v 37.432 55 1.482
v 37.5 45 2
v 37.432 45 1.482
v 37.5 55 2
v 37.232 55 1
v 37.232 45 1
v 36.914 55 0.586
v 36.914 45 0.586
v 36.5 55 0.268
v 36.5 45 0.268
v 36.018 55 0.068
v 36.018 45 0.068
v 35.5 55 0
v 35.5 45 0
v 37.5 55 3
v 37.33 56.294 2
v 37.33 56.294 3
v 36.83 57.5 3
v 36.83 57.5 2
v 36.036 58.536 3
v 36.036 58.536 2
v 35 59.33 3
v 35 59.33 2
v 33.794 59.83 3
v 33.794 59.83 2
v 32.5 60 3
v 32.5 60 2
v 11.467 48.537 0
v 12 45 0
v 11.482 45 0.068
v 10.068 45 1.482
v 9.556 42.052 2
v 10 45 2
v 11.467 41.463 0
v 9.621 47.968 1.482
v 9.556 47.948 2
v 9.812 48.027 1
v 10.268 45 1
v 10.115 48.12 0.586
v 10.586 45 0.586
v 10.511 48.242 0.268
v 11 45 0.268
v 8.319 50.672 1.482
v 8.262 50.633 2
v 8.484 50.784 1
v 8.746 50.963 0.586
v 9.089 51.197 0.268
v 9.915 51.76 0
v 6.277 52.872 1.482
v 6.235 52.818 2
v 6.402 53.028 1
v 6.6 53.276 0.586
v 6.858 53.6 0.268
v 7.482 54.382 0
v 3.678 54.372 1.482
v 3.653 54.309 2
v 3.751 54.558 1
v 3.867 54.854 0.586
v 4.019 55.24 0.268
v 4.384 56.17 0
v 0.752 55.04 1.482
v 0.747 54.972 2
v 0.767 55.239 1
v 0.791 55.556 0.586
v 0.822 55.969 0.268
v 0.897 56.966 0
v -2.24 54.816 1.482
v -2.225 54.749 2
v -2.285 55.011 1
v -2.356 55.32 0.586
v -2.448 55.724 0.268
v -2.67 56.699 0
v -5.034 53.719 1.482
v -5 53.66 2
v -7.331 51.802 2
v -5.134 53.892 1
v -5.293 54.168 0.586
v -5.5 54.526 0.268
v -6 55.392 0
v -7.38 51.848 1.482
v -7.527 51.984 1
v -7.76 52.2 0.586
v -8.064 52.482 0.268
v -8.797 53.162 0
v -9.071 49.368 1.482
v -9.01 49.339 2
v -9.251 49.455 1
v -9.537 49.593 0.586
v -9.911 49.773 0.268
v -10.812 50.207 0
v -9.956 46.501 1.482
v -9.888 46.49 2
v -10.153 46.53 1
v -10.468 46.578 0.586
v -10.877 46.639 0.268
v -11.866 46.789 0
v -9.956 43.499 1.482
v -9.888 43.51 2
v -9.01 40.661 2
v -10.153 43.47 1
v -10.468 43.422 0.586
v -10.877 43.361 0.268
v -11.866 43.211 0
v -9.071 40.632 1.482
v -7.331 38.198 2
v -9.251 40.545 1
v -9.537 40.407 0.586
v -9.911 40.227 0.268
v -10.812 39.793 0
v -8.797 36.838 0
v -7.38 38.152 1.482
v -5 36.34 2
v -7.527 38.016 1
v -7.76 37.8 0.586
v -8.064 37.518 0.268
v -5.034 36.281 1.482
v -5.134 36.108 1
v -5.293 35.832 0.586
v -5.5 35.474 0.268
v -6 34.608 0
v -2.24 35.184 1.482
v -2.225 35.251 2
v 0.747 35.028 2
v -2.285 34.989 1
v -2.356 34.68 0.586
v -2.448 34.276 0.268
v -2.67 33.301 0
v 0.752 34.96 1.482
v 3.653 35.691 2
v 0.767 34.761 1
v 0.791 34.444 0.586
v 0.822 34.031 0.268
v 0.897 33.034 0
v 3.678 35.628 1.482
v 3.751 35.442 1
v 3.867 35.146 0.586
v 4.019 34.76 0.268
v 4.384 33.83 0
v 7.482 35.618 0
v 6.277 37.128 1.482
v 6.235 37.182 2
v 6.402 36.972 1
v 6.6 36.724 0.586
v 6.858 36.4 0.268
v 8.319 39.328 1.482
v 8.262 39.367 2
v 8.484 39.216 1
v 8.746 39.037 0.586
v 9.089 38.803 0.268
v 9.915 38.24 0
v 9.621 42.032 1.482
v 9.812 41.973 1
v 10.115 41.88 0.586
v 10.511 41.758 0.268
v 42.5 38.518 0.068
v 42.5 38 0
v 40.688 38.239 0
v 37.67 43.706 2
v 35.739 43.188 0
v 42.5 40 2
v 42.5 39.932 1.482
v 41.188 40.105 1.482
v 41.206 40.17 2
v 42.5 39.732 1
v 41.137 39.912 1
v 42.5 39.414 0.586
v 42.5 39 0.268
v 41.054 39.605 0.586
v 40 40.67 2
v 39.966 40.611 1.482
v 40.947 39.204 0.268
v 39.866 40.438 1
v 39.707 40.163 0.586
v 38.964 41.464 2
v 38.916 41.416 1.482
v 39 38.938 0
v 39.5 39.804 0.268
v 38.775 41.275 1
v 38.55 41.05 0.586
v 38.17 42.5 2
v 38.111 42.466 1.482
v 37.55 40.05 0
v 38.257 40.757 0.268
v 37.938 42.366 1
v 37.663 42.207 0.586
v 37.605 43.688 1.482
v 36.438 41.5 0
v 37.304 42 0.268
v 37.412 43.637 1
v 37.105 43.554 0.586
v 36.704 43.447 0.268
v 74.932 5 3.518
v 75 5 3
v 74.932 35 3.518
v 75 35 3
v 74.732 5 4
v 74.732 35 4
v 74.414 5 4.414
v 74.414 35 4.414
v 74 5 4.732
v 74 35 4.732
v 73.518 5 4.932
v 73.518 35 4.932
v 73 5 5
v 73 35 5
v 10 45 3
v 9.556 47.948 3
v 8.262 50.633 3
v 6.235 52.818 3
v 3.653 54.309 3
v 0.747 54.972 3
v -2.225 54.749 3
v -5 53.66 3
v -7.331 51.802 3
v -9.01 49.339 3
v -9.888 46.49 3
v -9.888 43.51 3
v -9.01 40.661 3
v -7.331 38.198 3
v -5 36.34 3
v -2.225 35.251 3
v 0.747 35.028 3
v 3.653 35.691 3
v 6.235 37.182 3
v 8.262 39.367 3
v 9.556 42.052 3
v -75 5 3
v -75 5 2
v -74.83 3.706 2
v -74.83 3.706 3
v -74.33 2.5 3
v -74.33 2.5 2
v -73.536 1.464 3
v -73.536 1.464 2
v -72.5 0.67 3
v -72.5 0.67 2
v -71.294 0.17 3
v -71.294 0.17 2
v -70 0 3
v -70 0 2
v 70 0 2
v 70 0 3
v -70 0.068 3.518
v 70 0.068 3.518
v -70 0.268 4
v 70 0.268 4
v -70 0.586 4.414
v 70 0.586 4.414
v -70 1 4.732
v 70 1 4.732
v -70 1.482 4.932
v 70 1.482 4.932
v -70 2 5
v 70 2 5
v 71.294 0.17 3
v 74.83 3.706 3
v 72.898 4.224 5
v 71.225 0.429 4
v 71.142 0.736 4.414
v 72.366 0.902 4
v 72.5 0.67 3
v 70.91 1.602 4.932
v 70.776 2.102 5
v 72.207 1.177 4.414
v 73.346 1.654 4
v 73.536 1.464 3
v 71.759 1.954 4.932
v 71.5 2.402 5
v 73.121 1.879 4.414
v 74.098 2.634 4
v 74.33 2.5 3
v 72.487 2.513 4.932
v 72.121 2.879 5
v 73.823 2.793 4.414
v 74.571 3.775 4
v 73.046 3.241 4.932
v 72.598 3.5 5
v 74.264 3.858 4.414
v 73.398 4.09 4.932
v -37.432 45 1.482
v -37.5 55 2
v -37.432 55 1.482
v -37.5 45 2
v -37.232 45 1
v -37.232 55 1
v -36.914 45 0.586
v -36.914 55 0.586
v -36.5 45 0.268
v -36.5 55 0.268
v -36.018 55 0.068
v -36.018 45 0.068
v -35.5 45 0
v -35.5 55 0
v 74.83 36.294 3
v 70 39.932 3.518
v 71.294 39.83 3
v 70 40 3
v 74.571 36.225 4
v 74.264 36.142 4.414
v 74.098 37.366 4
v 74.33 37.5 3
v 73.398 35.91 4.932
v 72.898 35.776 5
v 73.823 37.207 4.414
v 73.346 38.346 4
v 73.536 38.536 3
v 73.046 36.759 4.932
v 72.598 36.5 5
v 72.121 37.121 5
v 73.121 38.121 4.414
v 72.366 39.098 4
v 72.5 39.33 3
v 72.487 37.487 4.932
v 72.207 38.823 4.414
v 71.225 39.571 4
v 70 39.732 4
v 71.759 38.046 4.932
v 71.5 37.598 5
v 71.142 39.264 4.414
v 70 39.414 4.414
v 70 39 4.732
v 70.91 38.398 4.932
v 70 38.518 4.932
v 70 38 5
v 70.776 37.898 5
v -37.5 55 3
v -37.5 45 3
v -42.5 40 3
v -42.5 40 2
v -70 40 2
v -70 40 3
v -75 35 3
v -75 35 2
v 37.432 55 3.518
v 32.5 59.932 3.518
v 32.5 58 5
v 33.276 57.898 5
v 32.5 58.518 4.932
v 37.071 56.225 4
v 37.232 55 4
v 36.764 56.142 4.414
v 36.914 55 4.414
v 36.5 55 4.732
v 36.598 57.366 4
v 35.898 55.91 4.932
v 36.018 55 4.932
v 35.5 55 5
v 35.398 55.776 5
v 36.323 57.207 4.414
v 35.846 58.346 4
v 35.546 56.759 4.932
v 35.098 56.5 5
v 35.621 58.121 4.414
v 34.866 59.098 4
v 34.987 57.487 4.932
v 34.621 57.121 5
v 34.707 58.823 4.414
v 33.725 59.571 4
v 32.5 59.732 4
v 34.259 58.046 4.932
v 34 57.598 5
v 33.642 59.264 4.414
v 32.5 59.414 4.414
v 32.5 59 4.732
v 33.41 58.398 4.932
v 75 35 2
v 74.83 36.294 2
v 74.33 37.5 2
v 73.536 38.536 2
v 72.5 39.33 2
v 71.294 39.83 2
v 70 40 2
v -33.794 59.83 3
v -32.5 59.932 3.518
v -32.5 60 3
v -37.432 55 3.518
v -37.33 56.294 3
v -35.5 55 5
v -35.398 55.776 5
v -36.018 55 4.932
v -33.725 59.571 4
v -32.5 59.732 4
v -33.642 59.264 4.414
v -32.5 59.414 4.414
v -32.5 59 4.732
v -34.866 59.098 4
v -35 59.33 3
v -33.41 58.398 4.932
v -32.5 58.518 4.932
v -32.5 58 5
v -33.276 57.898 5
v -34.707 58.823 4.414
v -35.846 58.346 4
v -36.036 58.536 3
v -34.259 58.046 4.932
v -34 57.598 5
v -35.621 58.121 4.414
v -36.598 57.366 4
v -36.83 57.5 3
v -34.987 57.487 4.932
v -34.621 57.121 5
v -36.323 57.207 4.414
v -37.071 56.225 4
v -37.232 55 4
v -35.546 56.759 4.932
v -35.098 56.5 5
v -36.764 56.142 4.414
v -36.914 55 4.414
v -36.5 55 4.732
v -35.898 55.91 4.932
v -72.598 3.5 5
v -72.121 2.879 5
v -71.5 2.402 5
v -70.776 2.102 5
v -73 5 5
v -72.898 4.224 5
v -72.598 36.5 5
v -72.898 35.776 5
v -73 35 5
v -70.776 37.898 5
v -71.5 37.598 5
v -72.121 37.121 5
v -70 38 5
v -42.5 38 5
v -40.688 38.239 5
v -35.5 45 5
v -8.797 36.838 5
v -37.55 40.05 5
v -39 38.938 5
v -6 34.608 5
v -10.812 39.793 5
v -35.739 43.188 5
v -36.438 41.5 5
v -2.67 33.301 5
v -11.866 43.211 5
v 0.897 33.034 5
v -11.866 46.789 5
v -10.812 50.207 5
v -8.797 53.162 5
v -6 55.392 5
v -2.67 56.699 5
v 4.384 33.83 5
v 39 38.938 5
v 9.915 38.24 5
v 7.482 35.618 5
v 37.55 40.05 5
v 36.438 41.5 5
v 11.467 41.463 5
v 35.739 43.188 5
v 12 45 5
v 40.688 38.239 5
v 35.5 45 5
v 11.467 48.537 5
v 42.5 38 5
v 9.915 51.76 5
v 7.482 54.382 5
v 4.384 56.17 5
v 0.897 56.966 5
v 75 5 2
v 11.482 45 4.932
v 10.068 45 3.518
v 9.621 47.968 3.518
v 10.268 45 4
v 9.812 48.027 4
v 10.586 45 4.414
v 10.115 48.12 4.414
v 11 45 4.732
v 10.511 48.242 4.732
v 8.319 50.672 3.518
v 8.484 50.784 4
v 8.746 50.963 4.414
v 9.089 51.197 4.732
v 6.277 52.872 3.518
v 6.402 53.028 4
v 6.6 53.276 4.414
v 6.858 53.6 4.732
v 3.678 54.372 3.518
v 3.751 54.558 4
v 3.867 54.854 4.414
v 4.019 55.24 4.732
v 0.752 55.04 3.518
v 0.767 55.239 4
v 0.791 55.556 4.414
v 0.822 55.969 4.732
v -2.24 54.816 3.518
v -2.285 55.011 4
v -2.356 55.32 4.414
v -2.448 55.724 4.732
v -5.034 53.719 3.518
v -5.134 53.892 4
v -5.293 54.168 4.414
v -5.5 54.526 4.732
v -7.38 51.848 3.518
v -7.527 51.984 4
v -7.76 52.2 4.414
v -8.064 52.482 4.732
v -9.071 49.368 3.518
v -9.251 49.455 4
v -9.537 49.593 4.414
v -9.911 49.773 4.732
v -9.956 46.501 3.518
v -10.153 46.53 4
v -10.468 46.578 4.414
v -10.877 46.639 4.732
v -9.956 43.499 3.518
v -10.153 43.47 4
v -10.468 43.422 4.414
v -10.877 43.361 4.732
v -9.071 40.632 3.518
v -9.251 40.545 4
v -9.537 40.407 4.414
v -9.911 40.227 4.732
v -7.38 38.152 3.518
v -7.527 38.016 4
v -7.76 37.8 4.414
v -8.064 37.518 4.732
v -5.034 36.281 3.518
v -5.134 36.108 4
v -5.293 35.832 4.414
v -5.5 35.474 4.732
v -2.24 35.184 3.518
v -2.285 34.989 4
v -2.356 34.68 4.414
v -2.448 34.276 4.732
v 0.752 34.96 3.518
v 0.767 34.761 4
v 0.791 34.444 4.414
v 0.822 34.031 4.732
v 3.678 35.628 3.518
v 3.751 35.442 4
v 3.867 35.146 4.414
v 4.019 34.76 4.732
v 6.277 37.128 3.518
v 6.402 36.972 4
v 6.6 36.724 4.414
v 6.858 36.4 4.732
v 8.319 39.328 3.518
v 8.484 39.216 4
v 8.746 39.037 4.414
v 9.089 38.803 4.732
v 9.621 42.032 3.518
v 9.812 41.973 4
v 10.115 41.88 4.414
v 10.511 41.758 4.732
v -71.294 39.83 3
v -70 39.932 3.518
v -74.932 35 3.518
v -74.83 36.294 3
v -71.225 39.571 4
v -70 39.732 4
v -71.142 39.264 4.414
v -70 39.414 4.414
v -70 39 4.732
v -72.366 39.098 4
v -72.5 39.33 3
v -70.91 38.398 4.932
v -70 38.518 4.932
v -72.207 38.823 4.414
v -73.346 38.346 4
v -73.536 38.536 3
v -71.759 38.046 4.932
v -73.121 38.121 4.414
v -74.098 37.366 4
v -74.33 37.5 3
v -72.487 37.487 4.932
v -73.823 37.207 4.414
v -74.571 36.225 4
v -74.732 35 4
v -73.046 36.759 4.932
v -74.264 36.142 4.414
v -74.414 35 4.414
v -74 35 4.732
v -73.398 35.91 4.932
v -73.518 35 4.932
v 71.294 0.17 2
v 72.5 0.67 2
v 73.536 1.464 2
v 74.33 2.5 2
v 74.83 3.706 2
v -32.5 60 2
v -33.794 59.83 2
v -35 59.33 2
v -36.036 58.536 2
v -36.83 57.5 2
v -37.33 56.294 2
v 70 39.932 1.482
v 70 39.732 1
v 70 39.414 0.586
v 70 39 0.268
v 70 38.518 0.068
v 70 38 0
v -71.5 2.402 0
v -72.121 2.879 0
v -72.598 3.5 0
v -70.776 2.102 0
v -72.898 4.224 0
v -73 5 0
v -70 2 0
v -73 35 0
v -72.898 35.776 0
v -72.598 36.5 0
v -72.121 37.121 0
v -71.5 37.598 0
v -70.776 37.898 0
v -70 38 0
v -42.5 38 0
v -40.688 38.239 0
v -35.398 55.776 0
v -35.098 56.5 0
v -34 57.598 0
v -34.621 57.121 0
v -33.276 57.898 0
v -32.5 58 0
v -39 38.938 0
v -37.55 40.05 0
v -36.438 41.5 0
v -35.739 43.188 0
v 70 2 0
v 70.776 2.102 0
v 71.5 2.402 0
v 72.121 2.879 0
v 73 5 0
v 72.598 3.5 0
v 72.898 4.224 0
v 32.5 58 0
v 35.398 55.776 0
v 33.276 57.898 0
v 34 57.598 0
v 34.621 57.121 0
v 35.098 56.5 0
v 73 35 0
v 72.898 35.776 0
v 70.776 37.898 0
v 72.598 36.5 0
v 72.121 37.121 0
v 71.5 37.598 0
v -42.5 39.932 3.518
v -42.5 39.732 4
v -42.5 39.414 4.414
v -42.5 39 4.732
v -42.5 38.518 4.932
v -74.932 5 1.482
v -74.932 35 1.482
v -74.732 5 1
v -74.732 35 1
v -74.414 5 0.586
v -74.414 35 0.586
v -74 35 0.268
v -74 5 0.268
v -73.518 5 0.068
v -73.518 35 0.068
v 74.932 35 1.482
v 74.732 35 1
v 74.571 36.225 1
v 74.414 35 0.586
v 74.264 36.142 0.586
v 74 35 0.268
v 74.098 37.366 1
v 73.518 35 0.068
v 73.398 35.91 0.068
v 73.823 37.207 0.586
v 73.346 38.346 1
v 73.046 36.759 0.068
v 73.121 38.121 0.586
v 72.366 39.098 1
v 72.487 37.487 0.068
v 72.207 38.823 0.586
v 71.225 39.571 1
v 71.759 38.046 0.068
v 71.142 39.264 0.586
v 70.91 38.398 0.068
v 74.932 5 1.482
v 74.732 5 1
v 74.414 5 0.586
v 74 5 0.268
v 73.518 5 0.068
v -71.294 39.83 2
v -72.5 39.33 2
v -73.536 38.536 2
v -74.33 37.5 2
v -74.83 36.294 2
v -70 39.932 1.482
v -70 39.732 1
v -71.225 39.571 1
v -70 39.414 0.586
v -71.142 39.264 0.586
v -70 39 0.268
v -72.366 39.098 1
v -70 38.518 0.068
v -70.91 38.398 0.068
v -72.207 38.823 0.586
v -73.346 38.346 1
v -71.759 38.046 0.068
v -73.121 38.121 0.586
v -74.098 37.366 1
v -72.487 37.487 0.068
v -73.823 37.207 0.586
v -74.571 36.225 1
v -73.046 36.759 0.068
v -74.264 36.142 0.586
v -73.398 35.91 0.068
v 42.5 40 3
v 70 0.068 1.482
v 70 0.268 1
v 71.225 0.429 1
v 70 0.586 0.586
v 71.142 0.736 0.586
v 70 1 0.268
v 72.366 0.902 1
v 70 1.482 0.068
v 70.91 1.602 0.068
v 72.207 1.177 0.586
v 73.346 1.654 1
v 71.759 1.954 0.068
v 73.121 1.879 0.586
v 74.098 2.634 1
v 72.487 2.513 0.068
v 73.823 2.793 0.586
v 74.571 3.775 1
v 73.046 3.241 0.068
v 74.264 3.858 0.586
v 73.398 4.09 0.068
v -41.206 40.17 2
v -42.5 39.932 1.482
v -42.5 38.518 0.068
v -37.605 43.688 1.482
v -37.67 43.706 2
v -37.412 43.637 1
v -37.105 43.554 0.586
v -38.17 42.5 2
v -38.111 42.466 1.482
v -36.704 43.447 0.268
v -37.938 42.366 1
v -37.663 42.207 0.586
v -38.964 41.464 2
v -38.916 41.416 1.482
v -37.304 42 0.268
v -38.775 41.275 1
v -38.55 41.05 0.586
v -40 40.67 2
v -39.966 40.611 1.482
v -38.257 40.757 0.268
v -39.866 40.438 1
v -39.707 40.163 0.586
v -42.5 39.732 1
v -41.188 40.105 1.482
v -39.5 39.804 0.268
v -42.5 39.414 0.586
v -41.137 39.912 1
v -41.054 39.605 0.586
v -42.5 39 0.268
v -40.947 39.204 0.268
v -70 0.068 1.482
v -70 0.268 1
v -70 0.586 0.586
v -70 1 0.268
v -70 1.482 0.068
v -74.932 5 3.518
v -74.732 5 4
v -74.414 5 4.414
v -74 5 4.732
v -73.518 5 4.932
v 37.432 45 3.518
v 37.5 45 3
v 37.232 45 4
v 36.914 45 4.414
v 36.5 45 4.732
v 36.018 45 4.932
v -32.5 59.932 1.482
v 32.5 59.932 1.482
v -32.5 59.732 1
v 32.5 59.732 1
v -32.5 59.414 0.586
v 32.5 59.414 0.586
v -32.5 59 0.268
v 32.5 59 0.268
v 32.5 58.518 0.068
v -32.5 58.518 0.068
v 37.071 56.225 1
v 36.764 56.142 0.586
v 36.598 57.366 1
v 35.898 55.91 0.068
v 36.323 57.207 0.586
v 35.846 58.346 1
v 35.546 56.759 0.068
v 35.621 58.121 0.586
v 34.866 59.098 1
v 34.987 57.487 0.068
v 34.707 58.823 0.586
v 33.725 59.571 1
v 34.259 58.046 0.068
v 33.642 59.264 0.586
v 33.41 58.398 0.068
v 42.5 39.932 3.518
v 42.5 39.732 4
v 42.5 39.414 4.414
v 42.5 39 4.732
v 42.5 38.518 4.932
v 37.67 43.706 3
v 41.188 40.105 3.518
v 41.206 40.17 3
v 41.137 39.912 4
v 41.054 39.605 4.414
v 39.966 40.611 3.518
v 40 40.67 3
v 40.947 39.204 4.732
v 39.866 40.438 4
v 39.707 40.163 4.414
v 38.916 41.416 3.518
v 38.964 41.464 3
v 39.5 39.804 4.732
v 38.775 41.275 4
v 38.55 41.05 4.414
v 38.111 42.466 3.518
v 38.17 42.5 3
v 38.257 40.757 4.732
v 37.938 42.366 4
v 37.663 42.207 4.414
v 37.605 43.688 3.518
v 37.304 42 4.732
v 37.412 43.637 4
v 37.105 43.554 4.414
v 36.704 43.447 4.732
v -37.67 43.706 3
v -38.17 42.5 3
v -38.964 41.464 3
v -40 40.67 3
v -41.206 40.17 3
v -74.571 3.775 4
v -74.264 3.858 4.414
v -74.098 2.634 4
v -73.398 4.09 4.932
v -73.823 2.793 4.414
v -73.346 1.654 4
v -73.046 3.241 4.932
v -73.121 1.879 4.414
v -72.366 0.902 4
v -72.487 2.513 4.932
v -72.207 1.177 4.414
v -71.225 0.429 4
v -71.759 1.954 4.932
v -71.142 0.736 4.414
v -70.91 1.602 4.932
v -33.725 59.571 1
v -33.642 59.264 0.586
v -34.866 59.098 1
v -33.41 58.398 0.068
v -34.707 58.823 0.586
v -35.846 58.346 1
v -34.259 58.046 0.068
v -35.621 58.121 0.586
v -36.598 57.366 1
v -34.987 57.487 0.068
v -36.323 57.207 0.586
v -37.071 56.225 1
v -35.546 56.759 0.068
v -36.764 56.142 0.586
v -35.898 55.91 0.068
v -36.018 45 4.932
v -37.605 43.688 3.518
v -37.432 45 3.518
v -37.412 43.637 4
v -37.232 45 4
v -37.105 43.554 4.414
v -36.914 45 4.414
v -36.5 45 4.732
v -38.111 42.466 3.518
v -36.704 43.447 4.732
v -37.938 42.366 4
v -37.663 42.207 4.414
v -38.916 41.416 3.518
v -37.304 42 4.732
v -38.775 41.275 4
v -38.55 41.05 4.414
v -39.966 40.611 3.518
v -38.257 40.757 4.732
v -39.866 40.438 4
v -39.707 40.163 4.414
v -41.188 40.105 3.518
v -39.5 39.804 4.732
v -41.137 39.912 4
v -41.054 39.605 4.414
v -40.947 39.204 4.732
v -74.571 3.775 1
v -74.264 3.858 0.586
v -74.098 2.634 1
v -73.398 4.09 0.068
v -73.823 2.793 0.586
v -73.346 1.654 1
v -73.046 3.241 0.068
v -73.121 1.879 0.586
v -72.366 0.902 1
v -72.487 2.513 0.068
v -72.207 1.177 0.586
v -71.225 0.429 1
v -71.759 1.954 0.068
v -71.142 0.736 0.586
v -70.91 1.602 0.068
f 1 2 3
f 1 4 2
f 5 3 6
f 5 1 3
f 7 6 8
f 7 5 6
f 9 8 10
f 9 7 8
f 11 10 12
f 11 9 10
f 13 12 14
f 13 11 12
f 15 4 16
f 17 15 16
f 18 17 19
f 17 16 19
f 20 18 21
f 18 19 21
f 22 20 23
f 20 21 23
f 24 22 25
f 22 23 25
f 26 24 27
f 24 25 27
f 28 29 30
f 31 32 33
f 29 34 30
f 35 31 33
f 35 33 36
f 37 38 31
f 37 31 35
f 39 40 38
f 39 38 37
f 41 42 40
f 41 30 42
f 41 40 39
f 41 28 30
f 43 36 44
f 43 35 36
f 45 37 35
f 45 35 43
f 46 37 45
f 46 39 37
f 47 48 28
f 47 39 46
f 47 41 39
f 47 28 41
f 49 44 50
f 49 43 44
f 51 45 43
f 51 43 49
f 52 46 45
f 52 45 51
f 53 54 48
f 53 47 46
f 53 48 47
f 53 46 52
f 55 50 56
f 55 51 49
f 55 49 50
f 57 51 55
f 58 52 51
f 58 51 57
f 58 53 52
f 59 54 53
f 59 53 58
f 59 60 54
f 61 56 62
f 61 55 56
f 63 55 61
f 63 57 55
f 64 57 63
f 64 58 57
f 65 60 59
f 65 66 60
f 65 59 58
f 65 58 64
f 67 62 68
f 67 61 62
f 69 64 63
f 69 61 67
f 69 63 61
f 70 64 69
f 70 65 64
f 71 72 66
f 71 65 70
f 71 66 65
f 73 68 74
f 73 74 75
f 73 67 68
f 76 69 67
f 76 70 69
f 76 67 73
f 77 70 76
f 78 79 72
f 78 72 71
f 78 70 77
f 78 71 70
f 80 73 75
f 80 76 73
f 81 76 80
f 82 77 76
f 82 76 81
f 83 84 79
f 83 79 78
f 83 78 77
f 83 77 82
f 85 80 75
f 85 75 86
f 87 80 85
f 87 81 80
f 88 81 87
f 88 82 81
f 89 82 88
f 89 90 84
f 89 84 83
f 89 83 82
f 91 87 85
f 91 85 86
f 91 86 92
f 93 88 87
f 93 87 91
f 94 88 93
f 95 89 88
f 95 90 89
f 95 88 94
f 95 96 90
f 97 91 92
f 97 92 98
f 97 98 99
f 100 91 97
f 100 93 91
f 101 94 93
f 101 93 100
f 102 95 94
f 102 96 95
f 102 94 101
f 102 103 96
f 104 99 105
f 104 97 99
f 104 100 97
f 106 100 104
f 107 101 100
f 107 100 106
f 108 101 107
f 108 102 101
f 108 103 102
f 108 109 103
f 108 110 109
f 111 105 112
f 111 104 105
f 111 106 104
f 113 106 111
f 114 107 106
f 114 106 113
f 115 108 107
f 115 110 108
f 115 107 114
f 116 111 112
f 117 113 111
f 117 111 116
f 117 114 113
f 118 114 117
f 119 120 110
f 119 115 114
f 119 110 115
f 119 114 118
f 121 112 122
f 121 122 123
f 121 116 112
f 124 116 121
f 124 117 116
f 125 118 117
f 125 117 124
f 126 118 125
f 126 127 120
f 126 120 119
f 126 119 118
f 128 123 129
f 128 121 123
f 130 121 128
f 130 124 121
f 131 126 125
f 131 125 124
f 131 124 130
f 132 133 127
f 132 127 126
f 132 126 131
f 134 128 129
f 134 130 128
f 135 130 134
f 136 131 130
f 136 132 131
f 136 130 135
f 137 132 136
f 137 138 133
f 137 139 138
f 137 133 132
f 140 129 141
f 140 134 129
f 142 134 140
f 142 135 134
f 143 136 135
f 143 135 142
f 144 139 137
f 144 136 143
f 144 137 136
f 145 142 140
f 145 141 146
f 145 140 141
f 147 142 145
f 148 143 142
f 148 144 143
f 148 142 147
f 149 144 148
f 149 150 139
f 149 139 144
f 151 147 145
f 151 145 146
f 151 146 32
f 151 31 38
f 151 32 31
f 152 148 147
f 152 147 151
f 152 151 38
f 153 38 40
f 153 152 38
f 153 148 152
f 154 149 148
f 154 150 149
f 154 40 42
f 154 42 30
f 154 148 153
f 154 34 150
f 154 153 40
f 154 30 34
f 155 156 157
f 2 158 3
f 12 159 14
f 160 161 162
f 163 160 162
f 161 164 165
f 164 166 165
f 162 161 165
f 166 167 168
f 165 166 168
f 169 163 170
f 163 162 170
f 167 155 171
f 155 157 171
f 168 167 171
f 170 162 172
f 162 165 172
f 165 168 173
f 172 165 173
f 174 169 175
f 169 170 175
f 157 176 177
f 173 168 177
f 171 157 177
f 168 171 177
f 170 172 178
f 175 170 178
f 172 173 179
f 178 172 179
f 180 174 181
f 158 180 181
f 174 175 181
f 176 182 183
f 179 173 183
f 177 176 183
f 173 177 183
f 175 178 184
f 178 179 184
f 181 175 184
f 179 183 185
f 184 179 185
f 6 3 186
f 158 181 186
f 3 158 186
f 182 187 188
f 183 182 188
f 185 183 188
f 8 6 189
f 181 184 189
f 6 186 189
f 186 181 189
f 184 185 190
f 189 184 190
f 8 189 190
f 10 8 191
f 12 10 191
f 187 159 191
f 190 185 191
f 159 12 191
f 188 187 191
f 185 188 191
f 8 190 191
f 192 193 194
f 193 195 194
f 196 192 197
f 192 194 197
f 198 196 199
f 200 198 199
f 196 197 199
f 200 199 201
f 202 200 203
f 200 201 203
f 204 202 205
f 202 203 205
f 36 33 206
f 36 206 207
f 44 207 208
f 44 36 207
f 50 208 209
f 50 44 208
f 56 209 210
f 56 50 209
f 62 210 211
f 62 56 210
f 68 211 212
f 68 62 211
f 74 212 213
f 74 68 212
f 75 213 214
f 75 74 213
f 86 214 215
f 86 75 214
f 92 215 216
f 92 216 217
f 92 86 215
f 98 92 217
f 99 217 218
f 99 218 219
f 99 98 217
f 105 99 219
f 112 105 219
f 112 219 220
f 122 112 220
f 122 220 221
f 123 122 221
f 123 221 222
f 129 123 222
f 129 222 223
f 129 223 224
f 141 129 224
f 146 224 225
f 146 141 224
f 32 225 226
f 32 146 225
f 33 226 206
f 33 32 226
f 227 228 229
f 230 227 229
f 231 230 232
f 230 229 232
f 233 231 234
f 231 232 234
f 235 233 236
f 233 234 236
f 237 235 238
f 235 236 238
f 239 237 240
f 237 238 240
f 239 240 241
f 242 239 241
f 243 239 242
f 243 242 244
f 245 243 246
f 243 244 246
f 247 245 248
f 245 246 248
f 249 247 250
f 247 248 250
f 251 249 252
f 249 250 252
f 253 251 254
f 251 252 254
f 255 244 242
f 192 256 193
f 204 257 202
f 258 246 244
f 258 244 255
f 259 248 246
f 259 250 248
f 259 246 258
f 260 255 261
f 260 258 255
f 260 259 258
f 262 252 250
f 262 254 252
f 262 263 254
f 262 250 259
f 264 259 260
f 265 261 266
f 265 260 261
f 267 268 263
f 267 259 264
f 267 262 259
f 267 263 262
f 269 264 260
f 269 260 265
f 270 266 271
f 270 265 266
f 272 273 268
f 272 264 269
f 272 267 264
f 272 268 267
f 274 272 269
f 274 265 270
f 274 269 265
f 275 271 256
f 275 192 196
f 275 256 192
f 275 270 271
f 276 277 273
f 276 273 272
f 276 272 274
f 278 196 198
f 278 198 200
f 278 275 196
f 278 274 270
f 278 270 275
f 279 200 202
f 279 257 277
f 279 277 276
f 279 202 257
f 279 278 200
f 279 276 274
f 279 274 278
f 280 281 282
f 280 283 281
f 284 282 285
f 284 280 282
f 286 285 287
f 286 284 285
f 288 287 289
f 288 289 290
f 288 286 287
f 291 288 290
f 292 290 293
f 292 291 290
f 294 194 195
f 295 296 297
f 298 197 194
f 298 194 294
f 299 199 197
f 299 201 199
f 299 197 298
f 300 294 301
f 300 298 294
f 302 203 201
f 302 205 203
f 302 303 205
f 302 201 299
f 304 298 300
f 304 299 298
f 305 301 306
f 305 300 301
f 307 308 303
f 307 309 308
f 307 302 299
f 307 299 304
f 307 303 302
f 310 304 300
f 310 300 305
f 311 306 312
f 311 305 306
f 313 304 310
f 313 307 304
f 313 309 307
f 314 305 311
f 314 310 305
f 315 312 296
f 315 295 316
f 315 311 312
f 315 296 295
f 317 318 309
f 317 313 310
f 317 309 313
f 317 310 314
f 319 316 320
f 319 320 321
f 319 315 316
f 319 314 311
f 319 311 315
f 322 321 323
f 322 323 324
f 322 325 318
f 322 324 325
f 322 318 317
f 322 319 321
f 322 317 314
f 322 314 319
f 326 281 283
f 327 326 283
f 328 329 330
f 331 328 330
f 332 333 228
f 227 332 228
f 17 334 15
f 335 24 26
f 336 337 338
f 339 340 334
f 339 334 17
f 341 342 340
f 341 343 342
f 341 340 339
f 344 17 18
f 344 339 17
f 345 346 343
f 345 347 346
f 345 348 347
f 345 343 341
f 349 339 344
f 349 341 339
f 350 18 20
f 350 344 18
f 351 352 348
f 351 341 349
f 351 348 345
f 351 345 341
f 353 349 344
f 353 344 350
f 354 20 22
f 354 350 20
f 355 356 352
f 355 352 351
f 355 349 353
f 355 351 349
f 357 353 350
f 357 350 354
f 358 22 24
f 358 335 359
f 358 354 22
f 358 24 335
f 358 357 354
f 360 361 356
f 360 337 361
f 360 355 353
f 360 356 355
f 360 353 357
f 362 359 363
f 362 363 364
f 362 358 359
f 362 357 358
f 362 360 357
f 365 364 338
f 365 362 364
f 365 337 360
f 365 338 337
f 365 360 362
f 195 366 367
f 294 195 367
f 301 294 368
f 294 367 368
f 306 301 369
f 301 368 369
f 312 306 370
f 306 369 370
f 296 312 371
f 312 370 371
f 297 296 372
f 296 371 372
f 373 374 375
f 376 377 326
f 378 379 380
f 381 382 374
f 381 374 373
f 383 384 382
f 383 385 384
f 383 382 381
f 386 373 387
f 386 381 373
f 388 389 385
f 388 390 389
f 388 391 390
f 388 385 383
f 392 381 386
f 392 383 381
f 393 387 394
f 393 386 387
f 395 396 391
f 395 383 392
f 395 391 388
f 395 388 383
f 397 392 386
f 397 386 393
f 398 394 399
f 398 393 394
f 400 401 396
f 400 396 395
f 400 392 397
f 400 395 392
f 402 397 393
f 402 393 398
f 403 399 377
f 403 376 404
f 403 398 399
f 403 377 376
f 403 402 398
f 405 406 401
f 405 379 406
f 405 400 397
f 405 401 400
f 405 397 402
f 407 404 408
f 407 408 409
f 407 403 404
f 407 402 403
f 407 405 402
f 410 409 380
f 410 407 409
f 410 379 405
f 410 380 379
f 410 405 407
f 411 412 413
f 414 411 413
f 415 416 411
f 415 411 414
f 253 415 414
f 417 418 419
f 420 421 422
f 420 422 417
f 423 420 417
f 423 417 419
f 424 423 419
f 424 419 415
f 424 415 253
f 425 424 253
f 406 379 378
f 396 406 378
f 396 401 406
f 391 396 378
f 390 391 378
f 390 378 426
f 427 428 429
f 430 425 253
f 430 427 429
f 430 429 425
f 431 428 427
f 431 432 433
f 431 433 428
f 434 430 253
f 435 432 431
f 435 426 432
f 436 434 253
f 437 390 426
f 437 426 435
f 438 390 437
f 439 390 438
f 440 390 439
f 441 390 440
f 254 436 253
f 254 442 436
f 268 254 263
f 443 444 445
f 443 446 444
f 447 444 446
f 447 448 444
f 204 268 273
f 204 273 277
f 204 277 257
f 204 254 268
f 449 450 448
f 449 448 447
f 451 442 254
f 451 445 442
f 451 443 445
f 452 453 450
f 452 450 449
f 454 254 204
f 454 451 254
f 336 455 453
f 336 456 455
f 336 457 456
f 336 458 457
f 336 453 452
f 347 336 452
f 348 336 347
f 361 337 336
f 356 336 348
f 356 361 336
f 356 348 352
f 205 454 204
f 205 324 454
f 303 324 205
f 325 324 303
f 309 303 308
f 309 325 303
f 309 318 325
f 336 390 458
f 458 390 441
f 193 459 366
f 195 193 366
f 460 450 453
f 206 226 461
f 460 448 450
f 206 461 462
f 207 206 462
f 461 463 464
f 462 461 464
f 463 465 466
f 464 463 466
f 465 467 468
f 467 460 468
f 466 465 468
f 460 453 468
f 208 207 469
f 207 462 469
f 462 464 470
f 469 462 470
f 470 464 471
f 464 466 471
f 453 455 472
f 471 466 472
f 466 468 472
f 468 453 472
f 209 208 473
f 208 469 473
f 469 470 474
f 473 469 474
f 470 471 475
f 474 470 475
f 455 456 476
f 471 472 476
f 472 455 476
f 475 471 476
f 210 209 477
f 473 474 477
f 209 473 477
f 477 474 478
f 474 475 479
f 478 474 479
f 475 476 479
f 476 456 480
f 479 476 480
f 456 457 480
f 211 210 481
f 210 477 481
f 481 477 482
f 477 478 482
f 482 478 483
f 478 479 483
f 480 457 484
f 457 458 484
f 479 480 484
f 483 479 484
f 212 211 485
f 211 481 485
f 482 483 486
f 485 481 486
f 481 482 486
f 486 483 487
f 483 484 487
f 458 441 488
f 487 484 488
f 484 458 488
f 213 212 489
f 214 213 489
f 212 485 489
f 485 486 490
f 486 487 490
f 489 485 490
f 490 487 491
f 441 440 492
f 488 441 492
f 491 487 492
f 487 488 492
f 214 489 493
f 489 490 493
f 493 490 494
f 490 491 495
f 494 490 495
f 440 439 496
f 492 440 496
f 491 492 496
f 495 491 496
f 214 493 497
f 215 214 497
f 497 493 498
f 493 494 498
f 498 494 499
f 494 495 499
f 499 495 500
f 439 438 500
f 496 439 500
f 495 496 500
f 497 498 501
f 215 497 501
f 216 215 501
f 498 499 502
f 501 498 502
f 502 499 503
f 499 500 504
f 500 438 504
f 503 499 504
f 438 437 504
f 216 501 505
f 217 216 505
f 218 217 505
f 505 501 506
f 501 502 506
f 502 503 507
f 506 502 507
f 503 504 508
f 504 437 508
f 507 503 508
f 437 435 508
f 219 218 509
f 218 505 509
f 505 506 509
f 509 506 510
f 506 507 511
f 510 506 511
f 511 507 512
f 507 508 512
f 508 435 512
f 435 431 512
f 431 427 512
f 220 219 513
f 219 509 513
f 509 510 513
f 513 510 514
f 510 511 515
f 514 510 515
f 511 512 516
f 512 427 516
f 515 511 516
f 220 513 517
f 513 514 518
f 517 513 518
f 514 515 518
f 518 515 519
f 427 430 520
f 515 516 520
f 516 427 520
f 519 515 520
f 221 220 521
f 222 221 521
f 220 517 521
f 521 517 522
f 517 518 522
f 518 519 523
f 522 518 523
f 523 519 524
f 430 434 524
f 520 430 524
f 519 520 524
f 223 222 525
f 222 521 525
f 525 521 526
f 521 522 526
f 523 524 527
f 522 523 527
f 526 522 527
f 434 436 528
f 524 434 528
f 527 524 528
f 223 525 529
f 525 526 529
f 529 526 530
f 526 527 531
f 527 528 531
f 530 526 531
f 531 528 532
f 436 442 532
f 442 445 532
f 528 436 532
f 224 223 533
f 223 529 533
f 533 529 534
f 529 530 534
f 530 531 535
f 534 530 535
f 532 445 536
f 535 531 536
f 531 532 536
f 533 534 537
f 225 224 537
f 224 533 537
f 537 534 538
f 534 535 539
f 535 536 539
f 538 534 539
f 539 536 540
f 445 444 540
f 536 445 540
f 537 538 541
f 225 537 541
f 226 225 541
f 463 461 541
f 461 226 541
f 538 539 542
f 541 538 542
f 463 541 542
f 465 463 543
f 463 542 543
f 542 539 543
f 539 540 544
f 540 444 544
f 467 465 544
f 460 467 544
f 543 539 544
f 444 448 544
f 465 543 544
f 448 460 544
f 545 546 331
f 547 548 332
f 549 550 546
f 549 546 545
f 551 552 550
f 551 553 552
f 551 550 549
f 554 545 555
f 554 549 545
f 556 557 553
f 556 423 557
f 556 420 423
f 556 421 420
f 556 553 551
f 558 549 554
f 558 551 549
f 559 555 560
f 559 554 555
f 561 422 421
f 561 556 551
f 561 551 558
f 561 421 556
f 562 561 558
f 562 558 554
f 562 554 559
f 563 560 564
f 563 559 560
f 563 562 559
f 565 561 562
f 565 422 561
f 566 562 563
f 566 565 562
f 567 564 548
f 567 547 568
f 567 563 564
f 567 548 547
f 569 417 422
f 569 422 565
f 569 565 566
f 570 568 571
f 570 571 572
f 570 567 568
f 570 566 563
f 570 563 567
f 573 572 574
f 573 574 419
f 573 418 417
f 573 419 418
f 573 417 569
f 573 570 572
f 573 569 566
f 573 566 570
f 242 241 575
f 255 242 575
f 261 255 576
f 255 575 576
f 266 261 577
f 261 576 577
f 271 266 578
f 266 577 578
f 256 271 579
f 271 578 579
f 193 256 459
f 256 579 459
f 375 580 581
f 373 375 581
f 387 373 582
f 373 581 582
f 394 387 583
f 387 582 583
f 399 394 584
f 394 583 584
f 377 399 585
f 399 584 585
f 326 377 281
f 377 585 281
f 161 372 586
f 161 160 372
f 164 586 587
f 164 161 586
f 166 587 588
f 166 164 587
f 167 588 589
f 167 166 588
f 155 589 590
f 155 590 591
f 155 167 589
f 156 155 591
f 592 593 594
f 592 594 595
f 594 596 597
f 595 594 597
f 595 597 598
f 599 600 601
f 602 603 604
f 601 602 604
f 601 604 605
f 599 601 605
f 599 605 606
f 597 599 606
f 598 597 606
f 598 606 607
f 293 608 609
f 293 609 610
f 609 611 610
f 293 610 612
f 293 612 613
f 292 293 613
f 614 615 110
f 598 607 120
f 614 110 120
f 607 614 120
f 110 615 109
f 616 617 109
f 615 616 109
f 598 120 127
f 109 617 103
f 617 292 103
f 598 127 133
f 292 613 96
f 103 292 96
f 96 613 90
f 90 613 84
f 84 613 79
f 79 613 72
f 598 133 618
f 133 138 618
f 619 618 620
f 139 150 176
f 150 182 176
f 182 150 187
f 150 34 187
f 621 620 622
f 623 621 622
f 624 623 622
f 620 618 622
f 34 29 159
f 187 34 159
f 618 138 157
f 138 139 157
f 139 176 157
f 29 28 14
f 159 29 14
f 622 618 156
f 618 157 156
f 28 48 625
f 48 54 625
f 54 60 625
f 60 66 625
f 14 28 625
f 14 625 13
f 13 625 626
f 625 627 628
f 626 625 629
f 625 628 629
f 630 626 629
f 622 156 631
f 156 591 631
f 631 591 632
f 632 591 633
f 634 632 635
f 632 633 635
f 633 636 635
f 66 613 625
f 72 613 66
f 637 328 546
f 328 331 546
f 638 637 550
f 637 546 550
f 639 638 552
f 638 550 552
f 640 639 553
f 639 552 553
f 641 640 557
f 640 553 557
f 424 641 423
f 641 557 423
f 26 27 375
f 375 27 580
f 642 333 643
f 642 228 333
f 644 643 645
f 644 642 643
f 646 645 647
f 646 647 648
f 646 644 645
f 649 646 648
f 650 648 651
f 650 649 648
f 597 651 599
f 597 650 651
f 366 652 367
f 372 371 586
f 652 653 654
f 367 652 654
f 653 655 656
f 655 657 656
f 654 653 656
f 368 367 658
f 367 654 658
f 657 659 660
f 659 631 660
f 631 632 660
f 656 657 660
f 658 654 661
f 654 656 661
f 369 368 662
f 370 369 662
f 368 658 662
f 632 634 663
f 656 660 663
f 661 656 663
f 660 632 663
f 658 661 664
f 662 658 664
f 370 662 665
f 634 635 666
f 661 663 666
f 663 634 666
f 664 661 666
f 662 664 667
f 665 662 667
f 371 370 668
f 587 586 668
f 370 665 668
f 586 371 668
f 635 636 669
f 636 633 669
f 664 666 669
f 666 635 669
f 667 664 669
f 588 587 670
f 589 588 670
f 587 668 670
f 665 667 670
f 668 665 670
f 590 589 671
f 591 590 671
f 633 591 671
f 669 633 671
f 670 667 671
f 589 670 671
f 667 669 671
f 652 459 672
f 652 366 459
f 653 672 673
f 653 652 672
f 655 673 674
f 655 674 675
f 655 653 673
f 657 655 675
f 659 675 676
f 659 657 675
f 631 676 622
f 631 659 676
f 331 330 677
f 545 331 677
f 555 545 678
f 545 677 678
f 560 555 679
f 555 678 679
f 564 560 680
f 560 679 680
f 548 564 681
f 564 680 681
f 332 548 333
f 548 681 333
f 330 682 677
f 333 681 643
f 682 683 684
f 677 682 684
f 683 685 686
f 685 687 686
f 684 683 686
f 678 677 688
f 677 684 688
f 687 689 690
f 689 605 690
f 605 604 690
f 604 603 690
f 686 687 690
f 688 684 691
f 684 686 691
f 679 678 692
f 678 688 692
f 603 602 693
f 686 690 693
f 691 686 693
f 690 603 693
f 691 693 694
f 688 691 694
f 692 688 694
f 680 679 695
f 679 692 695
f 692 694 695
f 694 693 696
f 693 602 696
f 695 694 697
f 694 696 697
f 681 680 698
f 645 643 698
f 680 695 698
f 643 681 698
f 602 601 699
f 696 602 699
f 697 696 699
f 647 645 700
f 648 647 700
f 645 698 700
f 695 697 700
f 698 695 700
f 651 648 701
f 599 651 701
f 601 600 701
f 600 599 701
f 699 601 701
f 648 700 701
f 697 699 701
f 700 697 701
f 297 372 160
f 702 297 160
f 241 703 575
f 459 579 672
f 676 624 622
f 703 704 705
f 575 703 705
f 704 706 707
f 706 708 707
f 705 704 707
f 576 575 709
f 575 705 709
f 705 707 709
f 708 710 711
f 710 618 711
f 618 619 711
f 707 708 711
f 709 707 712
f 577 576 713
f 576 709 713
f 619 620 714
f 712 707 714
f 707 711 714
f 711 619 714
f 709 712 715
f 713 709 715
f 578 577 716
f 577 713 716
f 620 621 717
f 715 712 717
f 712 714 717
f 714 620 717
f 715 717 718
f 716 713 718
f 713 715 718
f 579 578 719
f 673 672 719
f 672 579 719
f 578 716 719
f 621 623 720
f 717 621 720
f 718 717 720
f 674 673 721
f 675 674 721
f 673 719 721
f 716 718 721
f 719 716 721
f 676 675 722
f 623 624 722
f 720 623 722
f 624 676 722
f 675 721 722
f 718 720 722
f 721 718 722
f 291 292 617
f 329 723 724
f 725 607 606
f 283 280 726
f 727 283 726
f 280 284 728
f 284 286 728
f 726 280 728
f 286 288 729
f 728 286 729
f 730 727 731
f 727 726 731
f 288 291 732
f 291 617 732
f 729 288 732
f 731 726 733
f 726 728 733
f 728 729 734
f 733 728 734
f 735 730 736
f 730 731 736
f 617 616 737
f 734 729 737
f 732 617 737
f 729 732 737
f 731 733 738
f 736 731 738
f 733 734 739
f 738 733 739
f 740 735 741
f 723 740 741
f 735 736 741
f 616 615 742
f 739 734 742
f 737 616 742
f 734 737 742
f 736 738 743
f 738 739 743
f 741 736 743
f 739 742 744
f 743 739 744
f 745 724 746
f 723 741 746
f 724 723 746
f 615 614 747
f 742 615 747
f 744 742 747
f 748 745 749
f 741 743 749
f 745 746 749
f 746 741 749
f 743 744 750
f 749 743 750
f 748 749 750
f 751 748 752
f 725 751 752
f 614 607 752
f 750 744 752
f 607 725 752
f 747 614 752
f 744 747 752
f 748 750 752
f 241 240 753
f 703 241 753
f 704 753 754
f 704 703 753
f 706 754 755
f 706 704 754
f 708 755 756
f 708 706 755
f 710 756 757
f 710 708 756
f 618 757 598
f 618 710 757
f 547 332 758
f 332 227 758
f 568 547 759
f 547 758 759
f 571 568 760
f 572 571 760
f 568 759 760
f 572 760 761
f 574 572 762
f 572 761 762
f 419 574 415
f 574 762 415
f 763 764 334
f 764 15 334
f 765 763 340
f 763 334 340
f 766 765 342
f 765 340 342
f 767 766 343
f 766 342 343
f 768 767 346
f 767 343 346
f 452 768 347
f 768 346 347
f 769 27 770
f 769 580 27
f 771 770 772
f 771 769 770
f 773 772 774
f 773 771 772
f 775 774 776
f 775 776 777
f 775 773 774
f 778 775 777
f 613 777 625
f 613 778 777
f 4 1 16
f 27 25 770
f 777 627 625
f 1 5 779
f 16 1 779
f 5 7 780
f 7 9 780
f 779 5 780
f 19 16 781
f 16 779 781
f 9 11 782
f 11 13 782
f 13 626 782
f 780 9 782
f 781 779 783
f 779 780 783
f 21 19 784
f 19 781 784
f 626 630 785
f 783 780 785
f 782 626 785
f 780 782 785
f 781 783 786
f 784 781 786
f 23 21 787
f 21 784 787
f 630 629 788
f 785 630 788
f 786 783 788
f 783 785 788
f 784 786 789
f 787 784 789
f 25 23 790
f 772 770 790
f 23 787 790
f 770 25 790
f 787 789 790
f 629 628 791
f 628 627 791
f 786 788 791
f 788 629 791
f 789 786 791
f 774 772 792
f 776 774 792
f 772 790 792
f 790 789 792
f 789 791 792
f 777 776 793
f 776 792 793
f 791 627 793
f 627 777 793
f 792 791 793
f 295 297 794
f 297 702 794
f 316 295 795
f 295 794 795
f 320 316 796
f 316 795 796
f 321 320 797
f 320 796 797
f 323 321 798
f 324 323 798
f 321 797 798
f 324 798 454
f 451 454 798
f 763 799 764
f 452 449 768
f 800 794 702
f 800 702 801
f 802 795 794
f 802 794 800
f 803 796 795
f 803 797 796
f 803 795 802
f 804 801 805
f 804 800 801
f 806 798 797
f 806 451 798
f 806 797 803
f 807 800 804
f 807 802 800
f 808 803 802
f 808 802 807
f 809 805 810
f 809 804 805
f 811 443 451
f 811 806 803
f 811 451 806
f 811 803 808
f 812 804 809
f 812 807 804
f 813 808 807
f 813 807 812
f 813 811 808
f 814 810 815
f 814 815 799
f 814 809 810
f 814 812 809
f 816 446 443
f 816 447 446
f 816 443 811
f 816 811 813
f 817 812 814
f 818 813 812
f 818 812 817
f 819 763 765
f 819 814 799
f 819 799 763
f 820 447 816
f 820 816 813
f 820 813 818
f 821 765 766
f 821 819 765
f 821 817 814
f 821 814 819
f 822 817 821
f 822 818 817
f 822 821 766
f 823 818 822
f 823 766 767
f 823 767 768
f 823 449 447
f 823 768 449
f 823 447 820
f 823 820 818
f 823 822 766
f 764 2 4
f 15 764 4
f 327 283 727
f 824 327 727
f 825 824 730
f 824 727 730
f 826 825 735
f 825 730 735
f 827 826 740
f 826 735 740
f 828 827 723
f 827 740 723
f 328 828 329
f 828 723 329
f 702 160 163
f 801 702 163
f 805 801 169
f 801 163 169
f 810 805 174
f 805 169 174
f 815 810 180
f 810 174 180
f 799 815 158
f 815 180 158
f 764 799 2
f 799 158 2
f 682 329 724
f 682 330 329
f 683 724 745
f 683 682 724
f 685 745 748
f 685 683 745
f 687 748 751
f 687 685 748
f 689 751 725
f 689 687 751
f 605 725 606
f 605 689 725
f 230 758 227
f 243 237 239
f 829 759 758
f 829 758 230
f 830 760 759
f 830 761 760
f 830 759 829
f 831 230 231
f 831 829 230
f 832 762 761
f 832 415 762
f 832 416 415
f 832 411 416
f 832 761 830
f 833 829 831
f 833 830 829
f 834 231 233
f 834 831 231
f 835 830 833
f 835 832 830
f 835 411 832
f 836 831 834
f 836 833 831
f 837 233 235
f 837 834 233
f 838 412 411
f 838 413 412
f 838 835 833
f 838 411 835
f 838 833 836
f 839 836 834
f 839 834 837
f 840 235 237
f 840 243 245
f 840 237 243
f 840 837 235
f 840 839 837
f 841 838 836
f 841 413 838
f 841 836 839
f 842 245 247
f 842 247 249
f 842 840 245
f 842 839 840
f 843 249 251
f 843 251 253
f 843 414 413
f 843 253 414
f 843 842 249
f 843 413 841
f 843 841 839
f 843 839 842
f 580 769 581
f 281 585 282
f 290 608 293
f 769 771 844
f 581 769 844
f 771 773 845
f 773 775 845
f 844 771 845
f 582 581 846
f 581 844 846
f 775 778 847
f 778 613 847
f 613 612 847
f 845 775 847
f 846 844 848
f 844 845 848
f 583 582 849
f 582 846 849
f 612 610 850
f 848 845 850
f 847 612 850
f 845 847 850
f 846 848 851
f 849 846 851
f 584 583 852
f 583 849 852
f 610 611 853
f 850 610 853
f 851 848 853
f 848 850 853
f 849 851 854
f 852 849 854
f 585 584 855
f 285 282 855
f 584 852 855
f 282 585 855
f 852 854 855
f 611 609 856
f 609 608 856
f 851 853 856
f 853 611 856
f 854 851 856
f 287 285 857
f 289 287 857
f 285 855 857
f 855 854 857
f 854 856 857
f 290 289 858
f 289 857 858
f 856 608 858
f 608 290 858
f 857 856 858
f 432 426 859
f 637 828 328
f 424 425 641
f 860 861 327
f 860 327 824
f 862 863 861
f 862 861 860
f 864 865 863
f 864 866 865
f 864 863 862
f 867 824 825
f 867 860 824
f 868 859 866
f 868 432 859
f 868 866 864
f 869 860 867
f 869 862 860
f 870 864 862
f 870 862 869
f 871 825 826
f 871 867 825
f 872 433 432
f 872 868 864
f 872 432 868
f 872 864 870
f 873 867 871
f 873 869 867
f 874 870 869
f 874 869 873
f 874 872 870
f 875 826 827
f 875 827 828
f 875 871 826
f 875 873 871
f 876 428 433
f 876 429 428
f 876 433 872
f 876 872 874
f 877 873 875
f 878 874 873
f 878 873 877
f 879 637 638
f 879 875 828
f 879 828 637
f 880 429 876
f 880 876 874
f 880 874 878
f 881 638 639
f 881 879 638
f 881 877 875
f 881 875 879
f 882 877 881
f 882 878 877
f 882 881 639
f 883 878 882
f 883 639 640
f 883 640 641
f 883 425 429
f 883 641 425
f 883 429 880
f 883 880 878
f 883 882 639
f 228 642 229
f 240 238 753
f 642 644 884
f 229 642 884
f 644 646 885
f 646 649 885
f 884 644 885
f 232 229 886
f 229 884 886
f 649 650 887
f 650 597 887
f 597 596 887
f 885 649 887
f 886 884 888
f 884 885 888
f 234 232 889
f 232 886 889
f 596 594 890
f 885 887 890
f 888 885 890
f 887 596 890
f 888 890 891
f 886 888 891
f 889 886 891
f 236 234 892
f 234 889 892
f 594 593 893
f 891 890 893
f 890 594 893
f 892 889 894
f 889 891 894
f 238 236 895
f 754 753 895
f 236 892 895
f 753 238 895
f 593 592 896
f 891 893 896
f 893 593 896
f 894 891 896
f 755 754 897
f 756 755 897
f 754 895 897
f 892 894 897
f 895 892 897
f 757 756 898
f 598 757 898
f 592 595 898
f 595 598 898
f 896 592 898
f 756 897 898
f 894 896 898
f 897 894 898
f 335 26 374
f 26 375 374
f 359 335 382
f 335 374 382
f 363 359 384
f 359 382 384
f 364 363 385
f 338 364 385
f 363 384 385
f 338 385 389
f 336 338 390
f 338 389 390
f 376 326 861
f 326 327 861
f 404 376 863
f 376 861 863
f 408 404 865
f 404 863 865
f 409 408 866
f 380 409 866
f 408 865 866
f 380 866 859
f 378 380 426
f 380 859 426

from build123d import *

# Parameters (mm, degrees)
F0_R     = 10
F1_DEPTH = 5
F2_R     = 2


with BuildPart() as f1:
    # F0 (on Top) → F1 (new body)
    with BuildSketch(Plane.XY):
        with BuildLine():
            Line((-42.5, 40), (-70, 40))
            ThreePointArc((-70, 40), (-73.535534, 38.535534), (-75, 35))
            Line((-75, 35), (-75, 5))
            ThreePointArc((-75, 5), (-73.535534, 1.464466), (-70, 0))
            Line((-70, 0), (70, 0))
            ThreePointArc((70, 0), (73.535534, 1.464466), (75, 5))
            Line((75, 5), (75, 35))
            ThreePointArc((75, 35), (73.535534, 38.535534), (70, 40))
            Line((70, 40), (42.5, 40))
            ThreePointArc((42.5, 40), (38.964466, 41.464466), (37.5, 45))
            Line((37.5, 45), (37.5, 55))
            ThreePointArc((37.5, 55), (36.035534, 58.535534), (32.5, 60))
            Line((32.5, 60), (-32.5, 60))
            ThreePointArc((-32.5, 60), (-36.035534, 58.535534), (-37.5, 55))
            Line((-37.5, 55), (-37.5, 45))
            ThreePointArc((-37.5, 45), (-38.964466, 41.464466), (-42.5, 40))
        make_face()
        with Locations((0, 45)):
            Circle(F0_R, mode=Mode.SUBTRACT)
    extrude(amount=F1_DEPTH)

    # F2
    f2_edges = [f1.edges().sort_by_distance(p)[0] for p in [
        (0, 0, 5),
        (0, 0, 0),
        (-10, 45, 5),
        (-10, 45, 0),
    ]]
    fillet(f2_edges, radius=F2_R)


solid = f1.part
